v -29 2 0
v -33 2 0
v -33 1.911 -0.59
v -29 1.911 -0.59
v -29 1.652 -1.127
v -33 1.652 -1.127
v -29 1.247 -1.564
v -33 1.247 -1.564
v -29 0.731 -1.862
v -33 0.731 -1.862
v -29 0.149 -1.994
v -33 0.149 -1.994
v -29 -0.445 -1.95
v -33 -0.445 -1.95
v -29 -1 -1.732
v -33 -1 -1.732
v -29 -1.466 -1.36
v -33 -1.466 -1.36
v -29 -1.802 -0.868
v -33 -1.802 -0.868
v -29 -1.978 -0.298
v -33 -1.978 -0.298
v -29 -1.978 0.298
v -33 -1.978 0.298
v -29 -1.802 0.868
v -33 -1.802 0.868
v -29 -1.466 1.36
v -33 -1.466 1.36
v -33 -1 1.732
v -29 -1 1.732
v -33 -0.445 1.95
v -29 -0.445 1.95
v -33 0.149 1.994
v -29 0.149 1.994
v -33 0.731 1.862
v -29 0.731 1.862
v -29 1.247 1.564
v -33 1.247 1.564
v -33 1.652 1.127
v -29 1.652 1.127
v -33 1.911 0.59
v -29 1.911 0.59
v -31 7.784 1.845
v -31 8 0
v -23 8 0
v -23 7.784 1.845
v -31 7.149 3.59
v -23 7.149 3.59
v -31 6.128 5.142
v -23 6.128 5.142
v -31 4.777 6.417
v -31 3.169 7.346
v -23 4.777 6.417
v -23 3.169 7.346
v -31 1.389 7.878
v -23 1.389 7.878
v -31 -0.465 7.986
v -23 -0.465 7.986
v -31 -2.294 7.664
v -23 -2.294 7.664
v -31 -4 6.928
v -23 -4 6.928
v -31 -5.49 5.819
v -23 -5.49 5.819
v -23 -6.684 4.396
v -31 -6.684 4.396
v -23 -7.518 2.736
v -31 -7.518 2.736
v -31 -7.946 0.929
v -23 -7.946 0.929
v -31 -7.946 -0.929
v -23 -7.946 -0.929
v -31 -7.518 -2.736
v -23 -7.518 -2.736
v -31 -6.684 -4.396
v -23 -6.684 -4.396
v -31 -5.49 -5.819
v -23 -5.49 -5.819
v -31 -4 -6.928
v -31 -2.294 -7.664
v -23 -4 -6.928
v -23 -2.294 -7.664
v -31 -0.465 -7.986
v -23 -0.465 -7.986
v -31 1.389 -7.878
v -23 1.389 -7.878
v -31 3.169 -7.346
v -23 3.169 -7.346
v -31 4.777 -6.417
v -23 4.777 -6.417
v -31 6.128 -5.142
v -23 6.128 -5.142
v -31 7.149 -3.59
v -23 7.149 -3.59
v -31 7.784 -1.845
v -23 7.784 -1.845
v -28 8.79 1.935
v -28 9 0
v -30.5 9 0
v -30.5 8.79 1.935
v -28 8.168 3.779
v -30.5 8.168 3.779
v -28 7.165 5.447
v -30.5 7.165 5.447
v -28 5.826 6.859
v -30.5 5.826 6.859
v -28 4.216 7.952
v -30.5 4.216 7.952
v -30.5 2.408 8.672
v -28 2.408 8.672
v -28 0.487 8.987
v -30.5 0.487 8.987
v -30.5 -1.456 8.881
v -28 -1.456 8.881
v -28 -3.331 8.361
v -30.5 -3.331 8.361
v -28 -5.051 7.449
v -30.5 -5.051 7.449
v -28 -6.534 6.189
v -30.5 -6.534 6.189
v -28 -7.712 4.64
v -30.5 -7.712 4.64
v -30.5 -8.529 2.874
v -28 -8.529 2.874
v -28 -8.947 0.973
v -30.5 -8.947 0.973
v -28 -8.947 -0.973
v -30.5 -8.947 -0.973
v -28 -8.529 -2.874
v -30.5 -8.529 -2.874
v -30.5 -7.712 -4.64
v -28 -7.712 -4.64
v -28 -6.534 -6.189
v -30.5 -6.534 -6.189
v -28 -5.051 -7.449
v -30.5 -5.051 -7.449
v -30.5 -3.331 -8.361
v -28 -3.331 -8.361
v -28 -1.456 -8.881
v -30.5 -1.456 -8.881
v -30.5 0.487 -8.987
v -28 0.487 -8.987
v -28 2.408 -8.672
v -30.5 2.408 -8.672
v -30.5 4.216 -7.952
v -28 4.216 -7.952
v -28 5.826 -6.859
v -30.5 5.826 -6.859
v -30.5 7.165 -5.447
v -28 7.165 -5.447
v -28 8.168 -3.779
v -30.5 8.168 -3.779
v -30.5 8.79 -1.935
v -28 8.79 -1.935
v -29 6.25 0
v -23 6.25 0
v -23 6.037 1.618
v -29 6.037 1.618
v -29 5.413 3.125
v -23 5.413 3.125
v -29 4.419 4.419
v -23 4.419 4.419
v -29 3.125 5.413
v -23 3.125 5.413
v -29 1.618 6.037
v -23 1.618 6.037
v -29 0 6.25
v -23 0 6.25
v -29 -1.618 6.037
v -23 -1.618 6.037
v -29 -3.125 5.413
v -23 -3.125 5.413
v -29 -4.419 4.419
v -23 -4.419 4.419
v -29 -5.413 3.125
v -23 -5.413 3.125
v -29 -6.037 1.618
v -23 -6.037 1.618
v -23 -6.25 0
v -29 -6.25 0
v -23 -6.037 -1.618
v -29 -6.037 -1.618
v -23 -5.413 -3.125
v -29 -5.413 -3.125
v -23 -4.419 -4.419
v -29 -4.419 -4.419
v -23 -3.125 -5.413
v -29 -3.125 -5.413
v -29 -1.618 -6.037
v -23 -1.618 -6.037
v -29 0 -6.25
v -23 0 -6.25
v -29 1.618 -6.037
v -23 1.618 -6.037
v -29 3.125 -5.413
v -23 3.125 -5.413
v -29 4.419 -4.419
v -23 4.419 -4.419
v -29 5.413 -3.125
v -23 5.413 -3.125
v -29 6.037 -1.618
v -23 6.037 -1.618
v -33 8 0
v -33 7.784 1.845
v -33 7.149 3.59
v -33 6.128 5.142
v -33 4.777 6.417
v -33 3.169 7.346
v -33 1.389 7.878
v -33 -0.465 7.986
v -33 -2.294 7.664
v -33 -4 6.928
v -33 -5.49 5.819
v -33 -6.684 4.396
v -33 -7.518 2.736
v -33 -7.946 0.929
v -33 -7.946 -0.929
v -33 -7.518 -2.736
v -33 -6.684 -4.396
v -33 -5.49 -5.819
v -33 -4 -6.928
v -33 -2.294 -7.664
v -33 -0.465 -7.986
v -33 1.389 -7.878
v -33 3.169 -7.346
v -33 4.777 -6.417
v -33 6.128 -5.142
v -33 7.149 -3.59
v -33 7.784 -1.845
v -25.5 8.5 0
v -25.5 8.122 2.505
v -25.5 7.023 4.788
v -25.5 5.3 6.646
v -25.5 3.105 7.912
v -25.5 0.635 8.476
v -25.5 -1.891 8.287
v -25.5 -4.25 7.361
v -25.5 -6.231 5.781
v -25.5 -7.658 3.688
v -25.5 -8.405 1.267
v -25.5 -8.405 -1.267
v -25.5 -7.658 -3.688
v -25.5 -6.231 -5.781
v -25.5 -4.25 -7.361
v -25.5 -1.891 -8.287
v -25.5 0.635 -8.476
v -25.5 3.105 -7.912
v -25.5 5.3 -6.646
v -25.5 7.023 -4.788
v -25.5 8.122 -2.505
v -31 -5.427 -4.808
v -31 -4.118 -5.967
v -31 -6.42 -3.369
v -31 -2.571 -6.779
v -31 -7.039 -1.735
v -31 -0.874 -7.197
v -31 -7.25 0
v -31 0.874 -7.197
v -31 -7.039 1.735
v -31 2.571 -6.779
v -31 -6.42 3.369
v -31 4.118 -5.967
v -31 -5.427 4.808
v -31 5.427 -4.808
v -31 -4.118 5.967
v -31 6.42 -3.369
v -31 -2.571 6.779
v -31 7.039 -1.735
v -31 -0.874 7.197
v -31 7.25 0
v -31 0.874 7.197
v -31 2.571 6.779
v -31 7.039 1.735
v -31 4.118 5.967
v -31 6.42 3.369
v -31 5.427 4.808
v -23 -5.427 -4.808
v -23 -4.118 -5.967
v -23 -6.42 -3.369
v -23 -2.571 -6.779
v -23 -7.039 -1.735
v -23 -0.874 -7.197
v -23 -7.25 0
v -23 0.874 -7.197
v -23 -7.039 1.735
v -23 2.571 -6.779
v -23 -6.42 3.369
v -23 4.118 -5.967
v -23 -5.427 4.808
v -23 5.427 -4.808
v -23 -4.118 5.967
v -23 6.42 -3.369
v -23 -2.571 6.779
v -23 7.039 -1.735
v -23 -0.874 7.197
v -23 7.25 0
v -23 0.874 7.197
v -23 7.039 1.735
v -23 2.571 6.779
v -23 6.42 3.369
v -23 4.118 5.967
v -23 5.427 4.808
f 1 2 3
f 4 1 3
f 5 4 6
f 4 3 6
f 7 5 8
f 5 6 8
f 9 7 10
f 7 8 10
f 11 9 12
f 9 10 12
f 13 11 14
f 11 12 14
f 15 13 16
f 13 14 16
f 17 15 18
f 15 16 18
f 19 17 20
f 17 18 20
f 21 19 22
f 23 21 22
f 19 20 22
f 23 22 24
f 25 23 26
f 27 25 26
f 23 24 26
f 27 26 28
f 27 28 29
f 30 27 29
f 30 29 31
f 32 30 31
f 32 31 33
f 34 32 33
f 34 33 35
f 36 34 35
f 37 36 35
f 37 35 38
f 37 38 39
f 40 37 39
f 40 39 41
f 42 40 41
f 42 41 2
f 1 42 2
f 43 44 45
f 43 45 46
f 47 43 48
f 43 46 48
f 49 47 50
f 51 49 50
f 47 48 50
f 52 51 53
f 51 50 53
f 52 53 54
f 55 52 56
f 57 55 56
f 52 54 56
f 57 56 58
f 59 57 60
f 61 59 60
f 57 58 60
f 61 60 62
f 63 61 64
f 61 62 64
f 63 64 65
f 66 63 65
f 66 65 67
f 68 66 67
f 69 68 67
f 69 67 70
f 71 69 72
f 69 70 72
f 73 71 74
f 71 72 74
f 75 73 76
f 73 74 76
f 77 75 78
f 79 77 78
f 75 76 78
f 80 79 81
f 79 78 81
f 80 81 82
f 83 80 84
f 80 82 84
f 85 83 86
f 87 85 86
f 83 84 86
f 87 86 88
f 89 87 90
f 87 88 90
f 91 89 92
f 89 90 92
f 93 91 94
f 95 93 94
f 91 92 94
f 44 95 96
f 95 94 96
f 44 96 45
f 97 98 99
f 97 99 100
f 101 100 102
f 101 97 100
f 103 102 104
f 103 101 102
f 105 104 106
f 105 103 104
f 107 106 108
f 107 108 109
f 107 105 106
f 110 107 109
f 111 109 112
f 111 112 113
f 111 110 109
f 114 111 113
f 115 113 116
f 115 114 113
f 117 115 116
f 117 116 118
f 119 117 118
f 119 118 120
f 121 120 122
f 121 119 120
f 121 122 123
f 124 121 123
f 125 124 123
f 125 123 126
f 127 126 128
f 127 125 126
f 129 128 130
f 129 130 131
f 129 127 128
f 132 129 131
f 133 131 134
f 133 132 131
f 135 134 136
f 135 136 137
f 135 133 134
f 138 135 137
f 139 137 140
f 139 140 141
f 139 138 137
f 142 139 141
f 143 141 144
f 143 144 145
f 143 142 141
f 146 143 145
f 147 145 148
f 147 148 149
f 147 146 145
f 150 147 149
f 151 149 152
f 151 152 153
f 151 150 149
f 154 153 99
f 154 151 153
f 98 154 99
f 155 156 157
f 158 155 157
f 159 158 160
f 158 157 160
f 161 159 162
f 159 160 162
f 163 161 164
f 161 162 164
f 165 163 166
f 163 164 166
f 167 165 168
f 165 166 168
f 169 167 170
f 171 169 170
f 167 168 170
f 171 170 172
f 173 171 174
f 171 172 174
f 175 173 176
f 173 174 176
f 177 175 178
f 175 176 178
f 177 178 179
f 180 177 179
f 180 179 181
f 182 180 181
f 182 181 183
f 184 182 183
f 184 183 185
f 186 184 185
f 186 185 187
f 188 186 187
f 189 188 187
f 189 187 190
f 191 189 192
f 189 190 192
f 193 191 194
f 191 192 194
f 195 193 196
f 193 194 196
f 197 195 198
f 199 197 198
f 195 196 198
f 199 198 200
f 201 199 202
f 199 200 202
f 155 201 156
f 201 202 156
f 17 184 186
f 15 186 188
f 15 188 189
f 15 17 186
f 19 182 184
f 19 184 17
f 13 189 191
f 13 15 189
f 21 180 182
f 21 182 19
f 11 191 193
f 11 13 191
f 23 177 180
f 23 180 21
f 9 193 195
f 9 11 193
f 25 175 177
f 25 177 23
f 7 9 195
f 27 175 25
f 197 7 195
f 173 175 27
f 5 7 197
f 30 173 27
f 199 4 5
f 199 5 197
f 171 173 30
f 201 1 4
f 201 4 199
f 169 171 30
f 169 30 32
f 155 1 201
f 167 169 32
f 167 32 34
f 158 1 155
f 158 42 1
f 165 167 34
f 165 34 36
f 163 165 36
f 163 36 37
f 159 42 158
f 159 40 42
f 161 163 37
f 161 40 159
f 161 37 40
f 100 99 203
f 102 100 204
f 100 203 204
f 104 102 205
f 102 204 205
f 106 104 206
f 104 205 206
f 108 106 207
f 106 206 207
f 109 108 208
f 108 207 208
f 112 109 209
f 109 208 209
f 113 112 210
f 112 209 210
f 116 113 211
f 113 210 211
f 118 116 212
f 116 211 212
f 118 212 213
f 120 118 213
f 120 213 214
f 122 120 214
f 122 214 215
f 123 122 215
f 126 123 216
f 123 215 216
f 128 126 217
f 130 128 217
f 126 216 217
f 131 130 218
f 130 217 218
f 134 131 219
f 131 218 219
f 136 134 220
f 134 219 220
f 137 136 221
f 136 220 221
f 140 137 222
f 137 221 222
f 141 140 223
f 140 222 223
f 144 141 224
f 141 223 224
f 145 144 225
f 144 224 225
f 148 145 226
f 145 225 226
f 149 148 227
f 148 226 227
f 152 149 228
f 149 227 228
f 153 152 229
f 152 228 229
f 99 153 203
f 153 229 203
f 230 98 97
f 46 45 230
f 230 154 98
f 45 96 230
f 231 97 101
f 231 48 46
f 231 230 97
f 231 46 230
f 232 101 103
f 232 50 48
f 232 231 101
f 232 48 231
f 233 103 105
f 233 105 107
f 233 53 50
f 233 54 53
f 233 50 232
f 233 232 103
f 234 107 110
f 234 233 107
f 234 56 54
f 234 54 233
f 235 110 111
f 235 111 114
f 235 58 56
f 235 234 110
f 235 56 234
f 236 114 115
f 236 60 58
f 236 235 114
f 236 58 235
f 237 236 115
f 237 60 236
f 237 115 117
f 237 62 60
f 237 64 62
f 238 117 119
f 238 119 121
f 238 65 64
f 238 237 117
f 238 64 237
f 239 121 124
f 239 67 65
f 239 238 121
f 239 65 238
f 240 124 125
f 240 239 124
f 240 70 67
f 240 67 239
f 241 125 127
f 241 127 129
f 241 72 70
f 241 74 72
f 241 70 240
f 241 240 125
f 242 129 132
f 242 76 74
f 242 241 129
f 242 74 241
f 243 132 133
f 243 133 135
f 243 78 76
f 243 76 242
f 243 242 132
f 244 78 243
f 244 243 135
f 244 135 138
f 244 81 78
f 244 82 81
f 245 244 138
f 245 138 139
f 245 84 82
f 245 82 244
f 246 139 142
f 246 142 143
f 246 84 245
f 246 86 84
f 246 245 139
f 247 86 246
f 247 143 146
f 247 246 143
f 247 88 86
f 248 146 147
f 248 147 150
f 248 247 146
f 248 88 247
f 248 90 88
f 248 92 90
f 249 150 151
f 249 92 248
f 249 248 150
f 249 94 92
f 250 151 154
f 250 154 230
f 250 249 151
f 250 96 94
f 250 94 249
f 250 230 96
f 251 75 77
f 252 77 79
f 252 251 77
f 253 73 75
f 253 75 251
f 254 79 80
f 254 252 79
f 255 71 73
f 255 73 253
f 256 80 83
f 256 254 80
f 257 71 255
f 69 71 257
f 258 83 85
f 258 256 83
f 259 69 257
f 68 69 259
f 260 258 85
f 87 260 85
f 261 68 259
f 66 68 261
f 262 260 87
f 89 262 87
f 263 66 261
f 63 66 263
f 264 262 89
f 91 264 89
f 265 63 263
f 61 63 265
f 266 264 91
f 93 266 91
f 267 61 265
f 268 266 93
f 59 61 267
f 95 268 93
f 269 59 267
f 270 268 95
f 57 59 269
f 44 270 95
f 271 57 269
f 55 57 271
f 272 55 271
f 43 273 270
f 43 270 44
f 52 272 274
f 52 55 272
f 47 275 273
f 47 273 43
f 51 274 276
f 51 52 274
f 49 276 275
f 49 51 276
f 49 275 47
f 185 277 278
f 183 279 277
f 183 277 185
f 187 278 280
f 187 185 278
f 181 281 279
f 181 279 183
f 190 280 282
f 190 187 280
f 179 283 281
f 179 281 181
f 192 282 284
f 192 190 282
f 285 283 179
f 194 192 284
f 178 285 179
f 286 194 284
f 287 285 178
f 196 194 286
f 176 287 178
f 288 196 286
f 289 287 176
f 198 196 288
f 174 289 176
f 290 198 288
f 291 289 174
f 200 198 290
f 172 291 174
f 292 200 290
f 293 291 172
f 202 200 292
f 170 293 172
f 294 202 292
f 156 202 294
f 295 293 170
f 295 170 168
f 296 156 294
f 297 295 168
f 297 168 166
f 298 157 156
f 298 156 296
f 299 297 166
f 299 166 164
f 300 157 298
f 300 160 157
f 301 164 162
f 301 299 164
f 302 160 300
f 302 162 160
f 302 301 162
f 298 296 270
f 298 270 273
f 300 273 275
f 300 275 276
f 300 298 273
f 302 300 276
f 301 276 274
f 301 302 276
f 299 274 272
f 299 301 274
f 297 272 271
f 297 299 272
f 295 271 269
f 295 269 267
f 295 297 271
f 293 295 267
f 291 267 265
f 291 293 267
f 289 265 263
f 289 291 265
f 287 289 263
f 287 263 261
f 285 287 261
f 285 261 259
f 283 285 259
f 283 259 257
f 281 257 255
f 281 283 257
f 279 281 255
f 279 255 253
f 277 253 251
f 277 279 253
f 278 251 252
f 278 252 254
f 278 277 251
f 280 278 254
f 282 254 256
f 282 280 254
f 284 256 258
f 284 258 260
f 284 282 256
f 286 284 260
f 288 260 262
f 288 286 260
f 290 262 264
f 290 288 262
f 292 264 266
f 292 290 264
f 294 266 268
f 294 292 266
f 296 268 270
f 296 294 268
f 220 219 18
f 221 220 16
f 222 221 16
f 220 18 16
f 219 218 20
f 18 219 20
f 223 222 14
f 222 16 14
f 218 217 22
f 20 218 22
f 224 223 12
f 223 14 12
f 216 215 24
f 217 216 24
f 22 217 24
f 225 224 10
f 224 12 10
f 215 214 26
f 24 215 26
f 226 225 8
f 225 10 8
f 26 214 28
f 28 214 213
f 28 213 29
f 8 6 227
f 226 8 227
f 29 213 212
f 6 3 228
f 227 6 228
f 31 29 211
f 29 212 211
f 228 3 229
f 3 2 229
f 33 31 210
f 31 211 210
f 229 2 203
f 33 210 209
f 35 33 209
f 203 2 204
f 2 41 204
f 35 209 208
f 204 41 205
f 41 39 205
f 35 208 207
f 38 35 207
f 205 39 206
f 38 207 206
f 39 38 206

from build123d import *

# Parameters (mm, degrees)
SKETCH022_R      = 9
PAD008_DEPTH     = 10
CHAMFER002_SIZE2 = 1
CHAMFER002_SIZE  = 5
CHAMFER003_SIZE2 = 1
CHAMFER003_SIZE  = 2.5
SKETCH023_R      = 6.25
POCKET014_DEPTH  = 6
SKETCH024_R      = 2
POCKET015_DEPTH  = 5
SKETCH025_R      = 8
SKETCH025_R_2    = 7.25
POCKET016_DEPTH  = 8


with BuildPart() as part:
    # Sketch022 → Pad008 (new body)
    with BuildSketch(Plane.YZ):
        Circle(SKETCH022_R)
    extrude(amount=-PAD008_DEPTH)

    # Chamfer002
    chamfer002_edges = [part.edges().sort_by_distance(p)[0] for p in [
        (0, -9, 0),
    ]]
    chamfer002_side = part.faces().sort_by_distance((-5, -9, 0))[0]
    chamfer(chamfer002_edges, length=CHAMFER002_SIZE, length2=CHAMFER002_SIZE2, reference=chamfer002_side)

    # Chamfer003
    chamfer003_edges = [part.edges().sort_by_distance(p)[0] for p in [
        (-10, -9, 0),
    ]]
    chamfer003_side = part.faces().sort_by_distance((-7.5, -9, 0))[0]
    chamfer(chamfer003_edges, length=CHAMFER003_SIZE, length2=CHAMFER003_SIZE2, reference=chamfer003_side)

    # Sketch023 (on Face5 of Chamfer003) → Pocket014 (cut)
    with BuildSketch(Plane.YZ):
        Circle(SKETCH023_R)
    extrude(amount=-POCKET014_DEPTH, mode=Mode.SUBTRACT)

    # Sketch024 (on Face4 of Pocket014) → Pocket015 (cut)
    with BuildSketch(Plane(origin=(-10, 0, 0), x_dir=(0, 1, 0), z_dir=(-1, 0, 0))):
        Circle(SKETCH024_R)
    extrude(amount=-POCKET015_DEPTH, mode=Mode.SUBTRACT)

    # Sketch025 → Pocket016 (cut)
    with BuildSketch(Plane.YZ):
        Circle(SKETCH025_R)
        Circle(SKETCH025_R_2, mode=Mode.SUBTRACT)
    extrude(amount=-POCKET016_DEPTH, mode=Mode.SUBTRACT)


with BuildPart() as part_1:
    # Body005 placement: moved
    add(part.part.moved(Location((-23, 0, 0))))


solid = part_1.part
